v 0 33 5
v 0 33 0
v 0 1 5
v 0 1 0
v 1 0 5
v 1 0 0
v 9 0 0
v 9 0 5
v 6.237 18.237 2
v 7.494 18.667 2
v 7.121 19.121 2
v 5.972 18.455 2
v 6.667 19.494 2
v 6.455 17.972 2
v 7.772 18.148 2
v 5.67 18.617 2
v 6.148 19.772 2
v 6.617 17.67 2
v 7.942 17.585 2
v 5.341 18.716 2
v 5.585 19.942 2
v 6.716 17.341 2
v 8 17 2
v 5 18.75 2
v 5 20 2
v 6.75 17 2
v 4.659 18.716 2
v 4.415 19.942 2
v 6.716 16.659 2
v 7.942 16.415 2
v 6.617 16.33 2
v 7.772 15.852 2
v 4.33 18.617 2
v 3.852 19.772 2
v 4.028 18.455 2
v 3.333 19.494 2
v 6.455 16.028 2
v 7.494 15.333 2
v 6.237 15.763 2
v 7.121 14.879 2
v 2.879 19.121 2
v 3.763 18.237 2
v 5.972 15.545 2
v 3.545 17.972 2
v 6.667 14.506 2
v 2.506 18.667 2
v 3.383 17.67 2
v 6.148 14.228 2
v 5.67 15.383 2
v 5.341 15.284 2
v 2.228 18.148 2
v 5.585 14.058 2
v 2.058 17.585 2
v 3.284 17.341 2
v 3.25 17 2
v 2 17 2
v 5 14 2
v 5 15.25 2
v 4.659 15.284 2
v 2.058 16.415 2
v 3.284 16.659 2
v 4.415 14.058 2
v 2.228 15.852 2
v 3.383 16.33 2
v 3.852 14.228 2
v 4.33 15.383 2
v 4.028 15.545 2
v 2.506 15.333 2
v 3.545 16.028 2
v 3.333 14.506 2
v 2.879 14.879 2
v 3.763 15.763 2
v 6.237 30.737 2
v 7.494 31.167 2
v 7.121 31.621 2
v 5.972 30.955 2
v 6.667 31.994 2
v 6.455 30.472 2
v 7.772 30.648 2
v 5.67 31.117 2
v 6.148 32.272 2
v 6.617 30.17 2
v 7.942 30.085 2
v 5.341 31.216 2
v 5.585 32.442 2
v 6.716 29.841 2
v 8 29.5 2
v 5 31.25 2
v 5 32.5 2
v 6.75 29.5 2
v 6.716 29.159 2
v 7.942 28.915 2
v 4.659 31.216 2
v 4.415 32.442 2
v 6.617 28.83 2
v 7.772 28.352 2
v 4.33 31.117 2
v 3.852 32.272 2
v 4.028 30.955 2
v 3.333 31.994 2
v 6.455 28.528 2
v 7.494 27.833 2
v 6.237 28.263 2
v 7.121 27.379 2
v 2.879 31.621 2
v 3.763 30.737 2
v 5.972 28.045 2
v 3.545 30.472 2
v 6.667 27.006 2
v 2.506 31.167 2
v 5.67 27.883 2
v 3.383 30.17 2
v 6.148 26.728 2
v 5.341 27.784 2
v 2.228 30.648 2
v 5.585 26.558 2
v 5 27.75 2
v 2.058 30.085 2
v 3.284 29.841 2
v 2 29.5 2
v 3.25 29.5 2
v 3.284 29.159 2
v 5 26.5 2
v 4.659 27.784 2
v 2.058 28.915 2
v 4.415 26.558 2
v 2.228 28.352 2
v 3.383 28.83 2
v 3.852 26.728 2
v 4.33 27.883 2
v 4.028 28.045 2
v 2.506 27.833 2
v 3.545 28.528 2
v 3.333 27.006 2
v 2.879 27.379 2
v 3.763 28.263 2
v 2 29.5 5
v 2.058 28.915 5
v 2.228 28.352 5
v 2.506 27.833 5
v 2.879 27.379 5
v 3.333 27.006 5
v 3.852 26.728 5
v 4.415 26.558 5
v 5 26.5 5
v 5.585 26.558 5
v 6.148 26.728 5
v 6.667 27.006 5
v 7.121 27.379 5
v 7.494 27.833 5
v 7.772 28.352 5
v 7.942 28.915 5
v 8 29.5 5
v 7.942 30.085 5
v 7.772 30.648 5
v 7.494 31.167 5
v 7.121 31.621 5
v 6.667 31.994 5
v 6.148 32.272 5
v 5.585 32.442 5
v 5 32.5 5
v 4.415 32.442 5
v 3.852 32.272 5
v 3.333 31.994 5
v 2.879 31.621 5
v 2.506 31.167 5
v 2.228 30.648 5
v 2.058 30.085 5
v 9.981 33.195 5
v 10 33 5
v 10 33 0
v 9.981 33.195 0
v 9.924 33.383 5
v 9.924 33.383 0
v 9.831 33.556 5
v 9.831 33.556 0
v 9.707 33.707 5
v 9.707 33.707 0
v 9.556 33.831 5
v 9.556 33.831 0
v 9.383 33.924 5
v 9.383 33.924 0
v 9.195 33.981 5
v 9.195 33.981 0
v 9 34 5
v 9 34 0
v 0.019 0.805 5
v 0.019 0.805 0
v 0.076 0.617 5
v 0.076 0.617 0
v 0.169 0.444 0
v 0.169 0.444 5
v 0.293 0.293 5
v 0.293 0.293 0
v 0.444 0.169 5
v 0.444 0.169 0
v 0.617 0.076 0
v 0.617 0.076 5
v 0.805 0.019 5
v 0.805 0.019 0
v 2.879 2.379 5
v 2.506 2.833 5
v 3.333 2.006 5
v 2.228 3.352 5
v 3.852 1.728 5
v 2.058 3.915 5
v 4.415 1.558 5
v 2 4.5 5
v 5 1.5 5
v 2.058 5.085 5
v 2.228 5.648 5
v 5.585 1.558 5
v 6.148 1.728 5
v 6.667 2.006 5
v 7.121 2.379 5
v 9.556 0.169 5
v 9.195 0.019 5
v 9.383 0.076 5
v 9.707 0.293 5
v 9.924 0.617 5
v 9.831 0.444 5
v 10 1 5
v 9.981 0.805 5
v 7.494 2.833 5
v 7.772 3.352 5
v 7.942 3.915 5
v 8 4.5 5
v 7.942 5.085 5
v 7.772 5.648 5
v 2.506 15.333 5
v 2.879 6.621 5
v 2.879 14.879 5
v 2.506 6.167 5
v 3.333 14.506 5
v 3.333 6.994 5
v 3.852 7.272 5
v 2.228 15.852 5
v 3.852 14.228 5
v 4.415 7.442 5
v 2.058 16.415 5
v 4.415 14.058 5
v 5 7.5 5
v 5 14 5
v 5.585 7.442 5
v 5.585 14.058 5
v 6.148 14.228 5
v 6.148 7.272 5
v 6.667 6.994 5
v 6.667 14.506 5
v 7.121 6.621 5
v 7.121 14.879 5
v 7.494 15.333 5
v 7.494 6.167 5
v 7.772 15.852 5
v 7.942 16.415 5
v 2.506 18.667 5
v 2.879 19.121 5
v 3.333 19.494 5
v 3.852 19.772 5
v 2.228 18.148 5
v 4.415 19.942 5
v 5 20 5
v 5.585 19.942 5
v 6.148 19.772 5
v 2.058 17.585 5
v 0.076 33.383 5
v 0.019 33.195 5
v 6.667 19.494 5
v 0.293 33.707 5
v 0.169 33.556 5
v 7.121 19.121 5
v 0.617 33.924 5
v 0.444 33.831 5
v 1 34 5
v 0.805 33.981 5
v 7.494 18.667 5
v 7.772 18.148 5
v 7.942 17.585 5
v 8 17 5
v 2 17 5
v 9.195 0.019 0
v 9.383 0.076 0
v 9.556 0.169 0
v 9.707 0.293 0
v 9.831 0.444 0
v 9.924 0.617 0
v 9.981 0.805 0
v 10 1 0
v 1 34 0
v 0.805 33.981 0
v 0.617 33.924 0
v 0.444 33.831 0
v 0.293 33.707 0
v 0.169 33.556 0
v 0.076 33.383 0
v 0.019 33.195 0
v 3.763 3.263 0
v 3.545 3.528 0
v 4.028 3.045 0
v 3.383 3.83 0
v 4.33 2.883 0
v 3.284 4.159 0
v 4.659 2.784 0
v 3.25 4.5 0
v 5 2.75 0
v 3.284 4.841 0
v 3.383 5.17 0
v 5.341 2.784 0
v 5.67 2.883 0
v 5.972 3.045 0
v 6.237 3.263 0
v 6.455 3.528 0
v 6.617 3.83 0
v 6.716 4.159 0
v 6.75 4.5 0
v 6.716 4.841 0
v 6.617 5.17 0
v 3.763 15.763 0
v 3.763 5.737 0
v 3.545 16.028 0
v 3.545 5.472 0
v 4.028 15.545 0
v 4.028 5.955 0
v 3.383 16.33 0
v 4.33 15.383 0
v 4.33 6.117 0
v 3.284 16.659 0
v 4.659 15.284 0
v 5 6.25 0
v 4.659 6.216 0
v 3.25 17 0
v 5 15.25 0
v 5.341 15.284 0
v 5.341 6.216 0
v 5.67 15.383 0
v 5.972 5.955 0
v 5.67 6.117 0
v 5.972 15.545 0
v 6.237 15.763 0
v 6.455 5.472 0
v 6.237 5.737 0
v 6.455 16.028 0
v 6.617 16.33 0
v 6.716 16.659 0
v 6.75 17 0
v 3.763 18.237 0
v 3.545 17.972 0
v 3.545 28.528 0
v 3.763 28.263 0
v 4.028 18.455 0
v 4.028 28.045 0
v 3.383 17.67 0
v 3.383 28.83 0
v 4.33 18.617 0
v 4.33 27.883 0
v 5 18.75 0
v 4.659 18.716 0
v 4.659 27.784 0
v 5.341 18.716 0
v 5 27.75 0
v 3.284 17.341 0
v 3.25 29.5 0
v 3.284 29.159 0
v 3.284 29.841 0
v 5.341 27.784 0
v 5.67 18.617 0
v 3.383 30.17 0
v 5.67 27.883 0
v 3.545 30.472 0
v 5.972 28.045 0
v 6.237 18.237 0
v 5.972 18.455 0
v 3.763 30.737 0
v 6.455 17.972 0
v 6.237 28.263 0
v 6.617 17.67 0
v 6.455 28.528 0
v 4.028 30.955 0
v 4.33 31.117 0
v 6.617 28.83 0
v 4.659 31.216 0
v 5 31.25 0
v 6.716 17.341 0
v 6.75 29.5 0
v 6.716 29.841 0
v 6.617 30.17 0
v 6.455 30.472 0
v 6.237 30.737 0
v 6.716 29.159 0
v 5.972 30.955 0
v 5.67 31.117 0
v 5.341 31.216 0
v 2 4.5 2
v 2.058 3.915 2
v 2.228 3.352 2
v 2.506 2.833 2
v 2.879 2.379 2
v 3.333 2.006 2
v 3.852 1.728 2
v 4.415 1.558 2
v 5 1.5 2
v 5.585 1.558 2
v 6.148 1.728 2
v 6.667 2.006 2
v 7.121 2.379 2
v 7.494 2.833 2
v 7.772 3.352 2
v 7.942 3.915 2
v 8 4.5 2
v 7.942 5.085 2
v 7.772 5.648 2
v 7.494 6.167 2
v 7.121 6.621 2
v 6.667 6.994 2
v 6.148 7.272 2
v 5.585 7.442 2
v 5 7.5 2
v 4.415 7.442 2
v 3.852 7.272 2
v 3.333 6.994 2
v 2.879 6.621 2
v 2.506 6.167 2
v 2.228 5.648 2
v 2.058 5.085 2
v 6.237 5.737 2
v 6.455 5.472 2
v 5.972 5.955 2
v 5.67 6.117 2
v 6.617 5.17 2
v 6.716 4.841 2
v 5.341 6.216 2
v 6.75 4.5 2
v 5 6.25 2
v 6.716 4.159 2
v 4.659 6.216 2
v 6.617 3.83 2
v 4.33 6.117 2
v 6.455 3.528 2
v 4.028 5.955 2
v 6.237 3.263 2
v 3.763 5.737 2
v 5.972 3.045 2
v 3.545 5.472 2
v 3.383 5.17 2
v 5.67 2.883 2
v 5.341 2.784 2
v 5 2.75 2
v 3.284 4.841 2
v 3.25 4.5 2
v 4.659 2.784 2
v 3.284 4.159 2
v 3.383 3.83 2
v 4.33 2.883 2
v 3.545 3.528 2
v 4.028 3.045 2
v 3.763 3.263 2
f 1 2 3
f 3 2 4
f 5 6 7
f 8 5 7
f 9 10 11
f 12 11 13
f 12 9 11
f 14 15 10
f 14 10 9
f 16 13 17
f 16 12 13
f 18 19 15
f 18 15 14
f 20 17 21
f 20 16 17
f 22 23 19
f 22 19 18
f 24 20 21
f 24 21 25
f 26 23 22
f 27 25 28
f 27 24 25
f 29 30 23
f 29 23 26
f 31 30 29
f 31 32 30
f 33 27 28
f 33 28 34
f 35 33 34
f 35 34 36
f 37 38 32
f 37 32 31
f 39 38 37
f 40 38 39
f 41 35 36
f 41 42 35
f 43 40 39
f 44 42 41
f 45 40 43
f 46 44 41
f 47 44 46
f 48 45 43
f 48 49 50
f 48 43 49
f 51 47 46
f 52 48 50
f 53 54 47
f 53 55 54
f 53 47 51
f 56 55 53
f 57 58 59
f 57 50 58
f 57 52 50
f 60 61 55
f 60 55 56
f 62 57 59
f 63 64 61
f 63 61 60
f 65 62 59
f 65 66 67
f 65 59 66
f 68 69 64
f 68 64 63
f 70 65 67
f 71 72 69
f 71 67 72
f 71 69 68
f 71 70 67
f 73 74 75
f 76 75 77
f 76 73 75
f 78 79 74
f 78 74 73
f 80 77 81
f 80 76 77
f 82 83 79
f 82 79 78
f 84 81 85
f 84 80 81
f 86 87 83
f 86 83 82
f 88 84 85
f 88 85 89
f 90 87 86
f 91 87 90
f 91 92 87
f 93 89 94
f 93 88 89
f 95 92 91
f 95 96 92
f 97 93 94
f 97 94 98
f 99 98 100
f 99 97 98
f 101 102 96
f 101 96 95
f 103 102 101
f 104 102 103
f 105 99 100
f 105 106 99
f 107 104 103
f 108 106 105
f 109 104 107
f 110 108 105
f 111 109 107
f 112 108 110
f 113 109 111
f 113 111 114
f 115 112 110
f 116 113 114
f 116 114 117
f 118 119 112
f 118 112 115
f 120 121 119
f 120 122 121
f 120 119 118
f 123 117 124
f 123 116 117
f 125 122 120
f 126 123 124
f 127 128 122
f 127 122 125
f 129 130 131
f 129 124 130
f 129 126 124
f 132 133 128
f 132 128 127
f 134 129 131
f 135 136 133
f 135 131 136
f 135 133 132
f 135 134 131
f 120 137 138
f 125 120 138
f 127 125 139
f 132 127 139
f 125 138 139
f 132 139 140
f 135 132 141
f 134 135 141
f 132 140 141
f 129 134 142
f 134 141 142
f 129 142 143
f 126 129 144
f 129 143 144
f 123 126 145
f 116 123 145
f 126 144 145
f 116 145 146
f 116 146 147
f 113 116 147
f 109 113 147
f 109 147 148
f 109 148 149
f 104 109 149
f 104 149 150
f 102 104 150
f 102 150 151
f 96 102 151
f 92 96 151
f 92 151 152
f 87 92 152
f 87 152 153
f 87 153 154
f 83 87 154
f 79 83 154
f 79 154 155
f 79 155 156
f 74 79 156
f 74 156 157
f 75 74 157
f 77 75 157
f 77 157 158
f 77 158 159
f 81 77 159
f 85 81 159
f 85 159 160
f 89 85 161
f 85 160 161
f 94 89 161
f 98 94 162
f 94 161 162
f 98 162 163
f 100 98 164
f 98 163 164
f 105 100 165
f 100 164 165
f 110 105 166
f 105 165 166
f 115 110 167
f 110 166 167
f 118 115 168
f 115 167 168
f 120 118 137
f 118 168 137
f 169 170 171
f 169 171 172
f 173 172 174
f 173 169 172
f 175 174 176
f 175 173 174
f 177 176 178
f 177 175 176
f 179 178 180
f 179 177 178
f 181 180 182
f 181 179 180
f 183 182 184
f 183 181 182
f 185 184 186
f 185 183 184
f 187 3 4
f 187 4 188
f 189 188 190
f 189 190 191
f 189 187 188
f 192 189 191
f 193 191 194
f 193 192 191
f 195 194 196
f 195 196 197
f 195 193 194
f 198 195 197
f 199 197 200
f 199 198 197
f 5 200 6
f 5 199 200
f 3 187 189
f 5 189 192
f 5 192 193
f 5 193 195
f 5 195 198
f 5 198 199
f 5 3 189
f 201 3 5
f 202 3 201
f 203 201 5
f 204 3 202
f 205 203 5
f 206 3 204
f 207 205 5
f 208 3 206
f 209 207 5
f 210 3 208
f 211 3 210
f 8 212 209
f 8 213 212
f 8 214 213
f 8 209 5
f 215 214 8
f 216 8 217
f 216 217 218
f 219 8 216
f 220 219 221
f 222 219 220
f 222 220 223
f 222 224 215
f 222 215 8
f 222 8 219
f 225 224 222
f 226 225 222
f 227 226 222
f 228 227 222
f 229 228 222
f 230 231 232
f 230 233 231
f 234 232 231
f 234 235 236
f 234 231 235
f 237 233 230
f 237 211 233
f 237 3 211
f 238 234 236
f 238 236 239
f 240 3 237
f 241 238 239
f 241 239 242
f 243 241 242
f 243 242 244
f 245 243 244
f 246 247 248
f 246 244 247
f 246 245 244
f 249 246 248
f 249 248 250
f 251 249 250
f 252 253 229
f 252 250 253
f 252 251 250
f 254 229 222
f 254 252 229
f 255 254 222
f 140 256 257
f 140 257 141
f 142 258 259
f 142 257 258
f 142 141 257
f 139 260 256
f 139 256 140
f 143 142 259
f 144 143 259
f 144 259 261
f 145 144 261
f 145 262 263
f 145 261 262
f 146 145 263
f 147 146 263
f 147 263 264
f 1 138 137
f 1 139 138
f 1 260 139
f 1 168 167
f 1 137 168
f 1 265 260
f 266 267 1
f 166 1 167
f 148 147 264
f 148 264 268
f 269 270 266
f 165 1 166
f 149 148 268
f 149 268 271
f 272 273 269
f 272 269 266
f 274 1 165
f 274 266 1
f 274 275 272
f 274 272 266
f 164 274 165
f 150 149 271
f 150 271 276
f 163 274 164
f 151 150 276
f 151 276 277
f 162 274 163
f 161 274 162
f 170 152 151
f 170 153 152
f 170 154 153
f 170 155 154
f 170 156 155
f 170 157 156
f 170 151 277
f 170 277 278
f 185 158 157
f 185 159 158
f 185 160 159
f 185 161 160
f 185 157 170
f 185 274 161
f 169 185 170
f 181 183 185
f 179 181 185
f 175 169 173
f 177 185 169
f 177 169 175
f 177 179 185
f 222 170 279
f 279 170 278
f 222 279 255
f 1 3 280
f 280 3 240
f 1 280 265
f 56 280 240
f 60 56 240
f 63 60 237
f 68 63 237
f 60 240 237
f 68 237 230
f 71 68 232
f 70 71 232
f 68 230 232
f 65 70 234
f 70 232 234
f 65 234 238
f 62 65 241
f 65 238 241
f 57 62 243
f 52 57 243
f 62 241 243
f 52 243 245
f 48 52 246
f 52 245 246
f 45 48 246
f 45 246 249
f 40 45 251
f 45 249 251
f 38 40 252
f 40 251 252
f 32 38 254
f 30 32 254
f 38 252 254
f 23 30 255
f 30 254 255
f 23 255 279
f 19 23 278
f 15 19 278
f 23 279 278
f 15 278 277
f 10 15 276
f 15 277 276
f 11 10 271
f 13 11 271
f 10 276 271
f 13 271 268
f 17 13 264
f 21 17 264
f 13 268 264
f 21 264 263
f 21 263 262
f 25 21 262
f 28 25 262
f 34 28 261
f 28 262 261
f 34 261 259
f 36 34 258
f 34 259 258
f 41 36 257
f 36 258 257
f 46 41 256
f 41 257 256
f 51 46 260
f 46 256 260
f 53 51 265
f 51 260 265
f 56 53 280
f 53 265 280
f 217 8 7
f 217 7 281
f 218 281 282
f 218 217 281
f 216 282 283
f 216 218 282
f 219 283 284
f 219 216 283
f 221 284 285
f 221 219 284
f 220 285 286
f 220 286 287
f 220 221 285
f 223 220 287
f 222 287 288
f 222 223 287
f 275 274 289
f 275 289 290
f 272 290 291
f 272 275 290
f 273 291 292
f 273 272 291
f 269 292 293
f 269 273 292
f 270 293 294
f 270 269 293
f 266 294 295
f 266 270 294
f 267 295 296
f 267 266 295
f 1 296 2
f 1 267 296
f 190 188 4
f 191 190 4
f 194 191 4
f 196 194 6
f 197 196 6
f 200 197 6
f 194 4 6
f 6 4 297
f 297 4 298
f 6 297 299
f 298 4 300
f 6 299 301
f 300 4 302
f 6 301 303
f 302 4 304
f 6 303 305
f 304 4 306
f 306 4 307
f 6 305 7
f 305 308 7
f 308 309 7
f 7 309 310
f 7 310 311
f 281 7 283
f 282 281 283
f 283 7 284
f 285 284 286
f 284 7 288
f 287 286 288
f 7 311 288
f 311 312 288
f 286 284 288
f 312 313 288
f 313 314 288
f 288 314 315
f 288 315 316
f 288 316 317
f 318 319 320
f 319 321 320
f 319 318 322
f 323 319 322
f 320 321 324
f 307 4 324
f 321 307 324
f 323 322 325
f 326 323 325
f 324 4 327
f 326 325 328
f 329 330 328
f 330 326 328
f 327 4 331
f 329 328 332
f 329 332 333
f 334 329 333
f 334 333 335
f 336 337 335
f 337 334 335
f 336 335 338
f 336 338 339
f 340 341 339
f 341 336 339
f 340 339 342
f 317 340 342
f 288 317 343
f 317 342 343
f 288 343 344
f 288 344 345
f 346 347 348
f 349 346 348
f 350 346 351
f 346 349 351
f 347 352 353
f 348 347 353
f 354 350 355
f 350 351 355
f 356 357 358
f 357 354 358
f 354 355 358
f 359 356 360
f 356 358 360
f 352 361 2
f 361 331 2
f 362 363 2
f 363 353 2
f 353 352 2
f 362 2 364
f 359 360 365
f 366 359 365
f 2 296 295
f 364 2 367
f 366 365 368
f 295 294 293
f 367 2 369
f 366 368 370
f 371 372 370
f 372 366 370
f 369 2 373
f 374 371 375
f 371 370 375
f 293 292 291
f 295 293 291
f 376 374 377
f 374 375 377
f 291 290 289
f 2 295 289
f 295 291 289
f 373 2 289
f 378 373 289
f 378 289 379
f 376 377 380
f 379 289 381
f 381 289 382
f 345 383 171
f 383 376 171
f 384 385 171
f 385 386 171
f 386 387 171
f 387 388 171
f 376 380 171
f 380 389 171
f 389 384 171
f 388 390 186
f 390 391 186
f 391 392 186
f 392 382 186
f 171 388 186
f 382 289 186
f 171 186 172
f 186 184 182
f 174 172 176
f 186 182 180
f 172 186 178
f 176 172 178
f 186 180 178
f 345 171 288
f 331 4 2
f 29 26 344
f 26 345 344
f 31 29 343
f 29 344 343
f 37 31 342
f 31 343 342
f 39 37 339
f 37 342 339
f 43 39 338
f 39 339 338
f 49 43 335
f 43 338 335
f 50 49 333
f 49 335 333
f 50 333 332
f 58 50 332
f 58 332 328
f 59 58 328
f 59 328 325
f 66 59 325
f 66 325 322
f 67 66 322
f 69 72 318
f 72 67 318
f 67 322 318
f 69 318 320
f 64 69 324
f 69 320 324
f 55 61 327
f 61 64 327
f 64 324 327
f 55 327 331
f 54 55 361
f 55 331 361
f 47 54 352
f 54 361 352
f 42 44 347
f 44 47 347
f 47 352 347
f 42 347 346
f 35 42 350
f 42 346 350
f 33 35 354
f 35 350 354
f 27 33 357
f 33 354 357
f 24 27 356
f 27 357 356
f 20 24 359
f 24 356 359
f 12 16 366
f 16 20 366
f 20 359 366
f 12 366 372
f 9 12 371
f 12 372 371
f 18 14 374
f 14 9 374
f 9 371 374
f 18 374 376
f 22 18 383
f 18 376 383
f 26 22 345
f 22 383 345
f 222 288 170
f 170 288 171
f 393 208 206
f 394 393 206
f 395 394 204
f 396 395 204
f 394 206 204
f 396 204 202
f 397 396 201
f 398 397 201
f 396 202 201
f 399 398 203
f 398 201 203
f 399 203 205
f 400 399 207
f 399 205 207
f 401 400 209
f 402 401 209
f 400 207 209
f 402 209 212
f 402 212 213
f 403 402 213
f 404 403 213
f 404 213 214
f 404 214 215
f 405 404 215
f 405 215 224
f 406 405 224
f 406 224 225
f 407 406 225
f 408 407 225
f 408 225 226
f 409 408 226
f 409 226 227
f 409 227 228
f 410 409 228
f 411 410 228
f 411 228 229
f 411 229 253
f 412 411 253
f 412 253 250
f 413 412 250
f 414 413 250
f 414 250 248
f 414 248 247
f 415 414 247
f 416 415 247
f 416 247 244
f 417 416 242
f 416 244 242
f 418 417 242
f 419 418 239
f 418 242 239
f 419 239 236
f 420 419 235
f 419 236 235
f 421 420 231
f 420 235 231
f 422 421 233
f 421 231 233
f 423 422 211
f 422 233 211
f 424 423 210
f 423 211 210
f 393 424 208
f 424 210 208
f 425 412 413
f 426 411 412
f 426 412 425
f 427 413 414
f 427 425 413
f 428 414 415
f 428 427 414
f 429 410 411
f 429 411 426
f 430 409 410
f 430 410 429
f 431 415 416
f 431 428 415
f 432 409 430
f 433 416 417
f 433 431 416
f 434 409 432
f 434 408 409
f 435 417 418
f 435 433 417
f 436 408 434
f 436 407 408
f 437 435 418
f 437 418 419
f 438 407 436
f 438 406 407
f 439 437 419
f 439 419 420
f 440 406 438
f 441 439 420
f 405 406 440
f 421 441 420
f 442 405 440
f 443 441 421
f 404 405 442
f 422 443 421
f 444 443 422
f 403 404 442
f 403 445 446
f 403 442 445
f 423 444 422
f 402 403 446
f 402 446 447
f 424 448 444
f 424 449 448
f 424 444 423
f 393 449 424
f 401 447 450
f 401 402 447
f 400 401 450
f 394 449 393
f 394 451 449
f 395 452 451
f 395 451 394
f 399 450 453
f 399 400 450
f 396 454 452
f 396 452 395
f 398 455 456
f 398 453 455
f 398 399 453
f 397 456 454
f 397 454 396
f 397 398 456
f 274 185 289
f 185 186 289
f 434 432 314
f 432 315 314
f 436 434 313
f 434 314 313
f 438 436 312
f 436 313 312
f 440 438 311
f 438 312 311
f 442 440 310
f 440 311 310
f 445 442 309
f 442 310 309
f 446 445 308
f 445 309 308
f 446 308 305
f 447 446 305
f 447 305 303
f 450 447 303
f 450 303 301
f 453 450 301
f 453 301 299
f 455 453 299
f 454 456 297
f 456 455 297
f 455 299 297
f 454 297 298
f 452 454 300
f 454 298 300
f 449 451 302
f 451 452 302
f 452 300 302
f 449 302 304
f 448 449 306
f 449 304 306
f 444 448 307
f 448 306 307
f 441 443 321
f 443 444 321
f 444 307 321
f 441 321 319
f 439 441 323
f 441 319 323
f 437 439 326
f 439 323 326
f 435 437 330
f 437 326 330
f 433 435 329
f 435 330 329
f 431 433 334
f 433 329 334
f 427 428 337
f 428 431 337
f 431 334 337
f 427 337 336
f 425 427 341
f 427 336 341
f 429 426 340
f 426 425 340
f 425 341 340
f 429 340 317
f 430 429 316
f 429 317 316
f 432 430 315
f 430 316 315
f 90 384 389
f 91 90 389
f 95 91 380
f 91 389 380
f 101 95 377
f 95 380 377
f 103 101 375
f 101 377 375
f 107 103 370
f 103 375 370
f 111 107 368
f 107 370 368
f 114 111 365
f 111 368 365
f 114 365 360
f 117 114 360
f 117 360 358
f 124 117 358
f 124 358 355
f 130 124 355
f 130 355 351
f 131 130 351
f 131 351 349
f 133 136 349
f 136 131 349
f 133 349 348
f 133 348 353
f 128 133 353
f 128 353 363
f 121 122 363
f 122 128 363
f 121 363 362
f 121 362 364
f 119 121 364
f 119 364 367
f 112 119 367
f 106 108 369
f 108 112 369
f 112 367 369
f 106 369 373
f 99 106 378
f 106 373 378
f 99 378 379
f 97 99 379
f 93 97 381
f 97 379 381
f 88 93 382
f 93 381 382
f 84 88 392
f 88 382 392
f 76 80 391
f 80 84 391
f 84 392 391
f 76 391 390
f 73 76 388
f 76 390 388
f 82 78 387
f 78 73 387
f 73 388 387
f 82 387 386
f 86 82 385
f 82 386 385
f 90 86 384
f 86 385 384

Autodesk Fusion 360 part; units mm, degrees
sketch "スケッチ1" plane through (0, 0, 0) normal (0, 0, 1) x (1, 0, 0)
  line L0 (0, 0) -> (10, 0)
  line L1 (10, 0) -> (10, 34)
  line L2 (10, 34) -> (0, 34)
  line L3 (0, 34) -> (0, 0)
  line L4 (5, 34) -> (5, 0) construction
  line L5 (0, 17) -> (10, 17) construction
  circle A0 centre (5, 17) radius 1.75
  circle A1 centre (5, 29.5) radius 1.75
  circle A2 centre (5, 4.5) radius 1.75
  dimension "d1" = 34
  dimension "d2" = 10
  dimension "d3" = 3.5
  dimension "d4" = 3.5
  dimension "d5" = 3.5
  dimension "d6" = 12.5
  dimension "d7" = 12.5
extrude "押し出し1" add sketch "スケッチ1" along normal blind 5
sketch "スケッチ2" plane through (0, 0, 5) normal (0, 0, 1) x (-1, 0, 0)
  circle A0 centre (-5, -4.5) radius 1.75
  circle A1 centre (-5, -29.5) radius 1.75
  circle A2 centre (-5, -17) radius 1.75
  line L0 (0, -34) -> (0, 0)
  line L1 (0, 0) -> (-10, 0)
  line L2 (-10, 0) -> (-10, -34)
  line L3 (-10, -34) -> (0, -34)
  circle A3 centre (-5, -29.5) radius 3
  circle A4 centre (-5, -17) radius 3
  circle A5 centre (-5, -4.5) radius 3
  dimension "d10" = 6
  dimension "d11" = 6
  dimension "d12" = 6
extrude "押し出し2" cut sketch "スケッチ2" against normal blind 3 contours A3 | A4 | A5
fillet "フィレット1" radius 1 4 edges at (0, 0, 2.5) (10, 0, 2.5) (10, 34, 2.5) (0, 34, 2.5)
